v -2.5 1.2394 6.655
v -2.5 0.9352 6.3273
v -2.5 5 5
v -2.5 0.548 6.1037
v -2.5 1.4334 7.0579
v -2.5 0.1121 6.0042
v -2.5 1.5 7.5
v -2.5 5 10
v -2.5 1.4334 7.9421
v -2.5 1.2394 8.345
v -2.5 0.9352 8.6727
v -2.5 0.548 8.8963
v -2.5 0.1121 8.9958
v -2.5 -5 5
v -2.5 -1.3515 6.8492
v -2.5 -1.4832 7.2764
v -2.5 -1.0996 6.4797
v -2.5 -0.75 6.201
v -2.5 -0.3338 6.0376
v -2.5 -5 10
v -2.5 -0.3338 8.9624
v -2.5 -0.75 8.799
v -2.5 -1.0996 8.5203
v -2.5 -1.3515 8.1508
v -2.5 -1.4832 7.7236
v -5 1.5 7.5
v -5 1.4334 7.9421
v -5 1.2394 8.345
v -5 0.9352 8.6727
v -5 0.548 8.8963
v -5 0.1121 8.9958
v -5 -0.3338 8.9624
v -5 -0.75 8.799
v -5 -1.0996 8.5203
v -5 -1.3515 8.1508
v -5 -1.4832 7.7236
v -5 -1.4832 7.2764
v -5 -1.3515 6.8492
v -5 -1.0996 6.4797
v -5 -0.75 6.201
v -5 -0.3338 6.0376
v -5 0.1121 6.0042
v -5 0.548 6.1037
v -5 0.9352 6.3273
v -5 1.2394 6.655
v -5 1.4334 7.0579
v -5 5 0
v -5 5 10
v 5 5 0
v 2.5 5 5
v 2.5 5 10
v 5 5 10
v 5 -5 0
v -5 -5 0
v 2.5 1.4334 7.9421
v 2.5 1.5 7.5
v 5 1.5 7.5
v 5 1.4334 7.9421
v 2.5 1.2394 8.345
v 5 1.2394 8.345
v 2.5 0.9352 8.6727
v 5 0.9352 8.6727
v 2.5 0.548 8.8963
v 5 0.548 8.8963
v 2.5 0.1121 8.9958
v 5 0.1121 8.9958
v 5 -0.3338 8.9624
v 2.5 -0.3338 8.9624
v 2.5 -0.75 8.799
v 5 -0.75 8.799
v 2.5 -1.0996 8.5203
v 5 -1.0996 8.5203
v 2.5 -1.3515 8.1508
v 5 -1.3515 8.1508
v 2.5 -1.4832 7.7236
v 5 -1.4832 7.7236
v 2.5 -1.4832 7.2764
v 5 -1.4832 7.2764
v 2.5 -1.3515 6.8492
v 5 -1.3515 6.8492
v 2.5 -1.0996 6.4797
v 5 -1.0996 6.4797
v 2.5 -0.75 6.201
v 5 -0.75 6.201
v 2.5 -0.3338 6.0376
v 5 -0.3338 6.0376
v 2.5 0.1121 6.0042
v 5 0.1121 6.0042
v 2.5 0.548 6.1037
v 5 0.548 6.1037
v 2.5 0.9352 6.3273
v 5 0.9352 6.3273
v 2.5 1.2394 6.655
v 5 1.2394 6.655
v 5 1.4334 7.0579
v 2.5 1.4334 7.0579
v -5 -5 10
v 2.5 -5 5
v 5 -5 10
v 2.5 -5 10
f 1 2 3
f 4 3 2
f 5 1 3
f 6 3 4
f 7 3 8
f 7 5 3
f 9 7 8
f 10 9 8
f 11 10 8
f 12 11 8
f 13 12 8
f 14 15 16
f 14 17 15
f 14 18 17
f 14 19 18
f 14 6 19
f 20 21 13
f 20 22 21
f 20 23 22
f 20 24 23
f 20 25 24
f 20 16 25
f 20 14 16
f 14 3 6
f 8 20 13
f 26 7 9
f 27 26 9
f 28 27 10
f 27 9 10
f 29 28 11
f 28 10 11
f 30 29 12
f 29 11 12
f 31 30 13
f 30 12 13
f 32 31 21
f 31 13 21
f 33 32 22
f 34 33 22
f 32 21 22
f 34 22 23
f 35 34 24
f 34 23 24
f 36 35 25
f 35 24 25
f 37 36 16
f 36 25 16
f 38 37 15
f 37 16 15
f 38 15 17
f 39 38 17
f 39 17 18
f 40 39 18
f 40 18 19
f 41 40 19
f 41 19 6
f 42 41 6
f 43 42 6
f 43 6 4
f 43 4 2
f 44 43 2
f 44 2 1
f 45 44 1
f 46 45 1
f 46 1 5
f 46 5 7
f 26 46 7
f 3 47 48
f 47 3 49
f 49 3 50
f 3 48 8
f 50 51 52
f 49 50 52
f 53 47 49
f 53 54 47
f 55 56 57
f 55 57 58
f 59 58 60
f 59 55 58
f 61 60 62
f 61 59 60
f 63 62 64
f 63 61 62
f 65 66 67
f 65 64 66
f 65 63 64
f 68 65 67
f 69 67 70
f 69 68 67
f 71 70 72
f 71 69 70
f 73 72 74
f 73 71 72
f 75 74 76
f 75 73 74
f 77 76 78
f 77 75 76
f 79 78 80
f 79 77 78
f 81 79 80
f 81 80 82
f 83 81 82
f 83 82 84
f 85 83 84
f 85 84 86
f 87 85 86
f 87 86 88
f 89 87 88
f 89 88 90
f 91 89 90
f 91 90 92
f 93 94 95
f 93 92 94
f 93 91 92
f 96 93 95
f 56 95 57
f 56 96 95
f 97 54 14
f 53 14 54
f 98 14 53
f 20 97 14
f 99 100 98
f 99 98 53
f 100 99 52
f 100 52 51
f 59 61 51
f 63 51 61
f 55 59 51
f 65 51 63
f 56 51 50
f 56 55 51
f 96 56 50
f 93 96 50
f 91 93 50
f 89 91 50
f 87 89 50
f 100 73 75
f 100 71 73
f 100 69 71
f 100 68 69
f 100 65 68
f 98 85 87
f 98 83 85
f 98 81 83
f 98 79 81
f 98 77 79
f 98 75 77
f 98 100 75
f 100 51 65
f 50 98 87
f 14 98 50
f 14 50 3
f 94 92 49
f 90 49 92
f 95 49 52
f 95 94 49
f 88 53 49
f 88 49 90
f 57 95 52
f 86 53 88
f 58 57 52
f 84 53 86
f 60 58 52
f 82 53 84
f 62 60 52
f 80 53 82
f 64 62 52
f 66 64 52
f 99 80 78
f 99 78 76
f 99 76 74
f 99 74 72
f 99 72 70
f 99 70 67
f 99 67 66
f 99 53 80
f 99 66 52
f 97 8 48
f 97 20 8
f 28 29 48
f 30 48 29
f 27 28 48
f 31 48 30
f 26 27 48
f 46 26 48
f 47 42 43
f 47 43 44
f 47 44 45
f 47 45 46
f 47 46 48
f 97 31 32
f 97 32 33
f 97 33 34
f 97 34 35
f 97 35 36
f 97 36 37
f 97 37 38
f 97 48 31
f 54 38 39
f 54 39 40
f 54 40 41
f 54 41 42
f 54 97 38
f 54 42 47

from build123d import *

# Parameters (mm, degrees)
F1_DEPTH      = 5
F2_R          = 1.5
F3_DEPTH      = 2.501
F3_DEPTH_BACK = 7.501


with BuildPart() as f1:
    # F0 (on Front) → F1 (new body, symmetric)
    with BuildSketch(Plane.XZ):
        Polygon((-5, 0), (0, 0), (0, 5), (-2.5, 5), (-2.5, 10), (-5, 10), align=None)
        Polygon((0, 5), (0, 0), (5, 0), (5, 10), (2.5, 10), (2.5, 5), align=None)
    extrude(amount=F1_DEPTH, both=True)

    # F2 (on face) → F3 (cut, two sides)
    with BuildSketch(Plane.YZ.offset(-2.5)) as f3_sk:
        with Locations((0, 7.5)):
            Circle(F2_R)
    extrude(amount=-F3_DEPTH, mode=Mode.SUBTRACT)
    extrude(f3_sk.sketch, amount=F3_DEPTH_BACK, mode=Mode.SUBTRACT)


solid = f1.part
